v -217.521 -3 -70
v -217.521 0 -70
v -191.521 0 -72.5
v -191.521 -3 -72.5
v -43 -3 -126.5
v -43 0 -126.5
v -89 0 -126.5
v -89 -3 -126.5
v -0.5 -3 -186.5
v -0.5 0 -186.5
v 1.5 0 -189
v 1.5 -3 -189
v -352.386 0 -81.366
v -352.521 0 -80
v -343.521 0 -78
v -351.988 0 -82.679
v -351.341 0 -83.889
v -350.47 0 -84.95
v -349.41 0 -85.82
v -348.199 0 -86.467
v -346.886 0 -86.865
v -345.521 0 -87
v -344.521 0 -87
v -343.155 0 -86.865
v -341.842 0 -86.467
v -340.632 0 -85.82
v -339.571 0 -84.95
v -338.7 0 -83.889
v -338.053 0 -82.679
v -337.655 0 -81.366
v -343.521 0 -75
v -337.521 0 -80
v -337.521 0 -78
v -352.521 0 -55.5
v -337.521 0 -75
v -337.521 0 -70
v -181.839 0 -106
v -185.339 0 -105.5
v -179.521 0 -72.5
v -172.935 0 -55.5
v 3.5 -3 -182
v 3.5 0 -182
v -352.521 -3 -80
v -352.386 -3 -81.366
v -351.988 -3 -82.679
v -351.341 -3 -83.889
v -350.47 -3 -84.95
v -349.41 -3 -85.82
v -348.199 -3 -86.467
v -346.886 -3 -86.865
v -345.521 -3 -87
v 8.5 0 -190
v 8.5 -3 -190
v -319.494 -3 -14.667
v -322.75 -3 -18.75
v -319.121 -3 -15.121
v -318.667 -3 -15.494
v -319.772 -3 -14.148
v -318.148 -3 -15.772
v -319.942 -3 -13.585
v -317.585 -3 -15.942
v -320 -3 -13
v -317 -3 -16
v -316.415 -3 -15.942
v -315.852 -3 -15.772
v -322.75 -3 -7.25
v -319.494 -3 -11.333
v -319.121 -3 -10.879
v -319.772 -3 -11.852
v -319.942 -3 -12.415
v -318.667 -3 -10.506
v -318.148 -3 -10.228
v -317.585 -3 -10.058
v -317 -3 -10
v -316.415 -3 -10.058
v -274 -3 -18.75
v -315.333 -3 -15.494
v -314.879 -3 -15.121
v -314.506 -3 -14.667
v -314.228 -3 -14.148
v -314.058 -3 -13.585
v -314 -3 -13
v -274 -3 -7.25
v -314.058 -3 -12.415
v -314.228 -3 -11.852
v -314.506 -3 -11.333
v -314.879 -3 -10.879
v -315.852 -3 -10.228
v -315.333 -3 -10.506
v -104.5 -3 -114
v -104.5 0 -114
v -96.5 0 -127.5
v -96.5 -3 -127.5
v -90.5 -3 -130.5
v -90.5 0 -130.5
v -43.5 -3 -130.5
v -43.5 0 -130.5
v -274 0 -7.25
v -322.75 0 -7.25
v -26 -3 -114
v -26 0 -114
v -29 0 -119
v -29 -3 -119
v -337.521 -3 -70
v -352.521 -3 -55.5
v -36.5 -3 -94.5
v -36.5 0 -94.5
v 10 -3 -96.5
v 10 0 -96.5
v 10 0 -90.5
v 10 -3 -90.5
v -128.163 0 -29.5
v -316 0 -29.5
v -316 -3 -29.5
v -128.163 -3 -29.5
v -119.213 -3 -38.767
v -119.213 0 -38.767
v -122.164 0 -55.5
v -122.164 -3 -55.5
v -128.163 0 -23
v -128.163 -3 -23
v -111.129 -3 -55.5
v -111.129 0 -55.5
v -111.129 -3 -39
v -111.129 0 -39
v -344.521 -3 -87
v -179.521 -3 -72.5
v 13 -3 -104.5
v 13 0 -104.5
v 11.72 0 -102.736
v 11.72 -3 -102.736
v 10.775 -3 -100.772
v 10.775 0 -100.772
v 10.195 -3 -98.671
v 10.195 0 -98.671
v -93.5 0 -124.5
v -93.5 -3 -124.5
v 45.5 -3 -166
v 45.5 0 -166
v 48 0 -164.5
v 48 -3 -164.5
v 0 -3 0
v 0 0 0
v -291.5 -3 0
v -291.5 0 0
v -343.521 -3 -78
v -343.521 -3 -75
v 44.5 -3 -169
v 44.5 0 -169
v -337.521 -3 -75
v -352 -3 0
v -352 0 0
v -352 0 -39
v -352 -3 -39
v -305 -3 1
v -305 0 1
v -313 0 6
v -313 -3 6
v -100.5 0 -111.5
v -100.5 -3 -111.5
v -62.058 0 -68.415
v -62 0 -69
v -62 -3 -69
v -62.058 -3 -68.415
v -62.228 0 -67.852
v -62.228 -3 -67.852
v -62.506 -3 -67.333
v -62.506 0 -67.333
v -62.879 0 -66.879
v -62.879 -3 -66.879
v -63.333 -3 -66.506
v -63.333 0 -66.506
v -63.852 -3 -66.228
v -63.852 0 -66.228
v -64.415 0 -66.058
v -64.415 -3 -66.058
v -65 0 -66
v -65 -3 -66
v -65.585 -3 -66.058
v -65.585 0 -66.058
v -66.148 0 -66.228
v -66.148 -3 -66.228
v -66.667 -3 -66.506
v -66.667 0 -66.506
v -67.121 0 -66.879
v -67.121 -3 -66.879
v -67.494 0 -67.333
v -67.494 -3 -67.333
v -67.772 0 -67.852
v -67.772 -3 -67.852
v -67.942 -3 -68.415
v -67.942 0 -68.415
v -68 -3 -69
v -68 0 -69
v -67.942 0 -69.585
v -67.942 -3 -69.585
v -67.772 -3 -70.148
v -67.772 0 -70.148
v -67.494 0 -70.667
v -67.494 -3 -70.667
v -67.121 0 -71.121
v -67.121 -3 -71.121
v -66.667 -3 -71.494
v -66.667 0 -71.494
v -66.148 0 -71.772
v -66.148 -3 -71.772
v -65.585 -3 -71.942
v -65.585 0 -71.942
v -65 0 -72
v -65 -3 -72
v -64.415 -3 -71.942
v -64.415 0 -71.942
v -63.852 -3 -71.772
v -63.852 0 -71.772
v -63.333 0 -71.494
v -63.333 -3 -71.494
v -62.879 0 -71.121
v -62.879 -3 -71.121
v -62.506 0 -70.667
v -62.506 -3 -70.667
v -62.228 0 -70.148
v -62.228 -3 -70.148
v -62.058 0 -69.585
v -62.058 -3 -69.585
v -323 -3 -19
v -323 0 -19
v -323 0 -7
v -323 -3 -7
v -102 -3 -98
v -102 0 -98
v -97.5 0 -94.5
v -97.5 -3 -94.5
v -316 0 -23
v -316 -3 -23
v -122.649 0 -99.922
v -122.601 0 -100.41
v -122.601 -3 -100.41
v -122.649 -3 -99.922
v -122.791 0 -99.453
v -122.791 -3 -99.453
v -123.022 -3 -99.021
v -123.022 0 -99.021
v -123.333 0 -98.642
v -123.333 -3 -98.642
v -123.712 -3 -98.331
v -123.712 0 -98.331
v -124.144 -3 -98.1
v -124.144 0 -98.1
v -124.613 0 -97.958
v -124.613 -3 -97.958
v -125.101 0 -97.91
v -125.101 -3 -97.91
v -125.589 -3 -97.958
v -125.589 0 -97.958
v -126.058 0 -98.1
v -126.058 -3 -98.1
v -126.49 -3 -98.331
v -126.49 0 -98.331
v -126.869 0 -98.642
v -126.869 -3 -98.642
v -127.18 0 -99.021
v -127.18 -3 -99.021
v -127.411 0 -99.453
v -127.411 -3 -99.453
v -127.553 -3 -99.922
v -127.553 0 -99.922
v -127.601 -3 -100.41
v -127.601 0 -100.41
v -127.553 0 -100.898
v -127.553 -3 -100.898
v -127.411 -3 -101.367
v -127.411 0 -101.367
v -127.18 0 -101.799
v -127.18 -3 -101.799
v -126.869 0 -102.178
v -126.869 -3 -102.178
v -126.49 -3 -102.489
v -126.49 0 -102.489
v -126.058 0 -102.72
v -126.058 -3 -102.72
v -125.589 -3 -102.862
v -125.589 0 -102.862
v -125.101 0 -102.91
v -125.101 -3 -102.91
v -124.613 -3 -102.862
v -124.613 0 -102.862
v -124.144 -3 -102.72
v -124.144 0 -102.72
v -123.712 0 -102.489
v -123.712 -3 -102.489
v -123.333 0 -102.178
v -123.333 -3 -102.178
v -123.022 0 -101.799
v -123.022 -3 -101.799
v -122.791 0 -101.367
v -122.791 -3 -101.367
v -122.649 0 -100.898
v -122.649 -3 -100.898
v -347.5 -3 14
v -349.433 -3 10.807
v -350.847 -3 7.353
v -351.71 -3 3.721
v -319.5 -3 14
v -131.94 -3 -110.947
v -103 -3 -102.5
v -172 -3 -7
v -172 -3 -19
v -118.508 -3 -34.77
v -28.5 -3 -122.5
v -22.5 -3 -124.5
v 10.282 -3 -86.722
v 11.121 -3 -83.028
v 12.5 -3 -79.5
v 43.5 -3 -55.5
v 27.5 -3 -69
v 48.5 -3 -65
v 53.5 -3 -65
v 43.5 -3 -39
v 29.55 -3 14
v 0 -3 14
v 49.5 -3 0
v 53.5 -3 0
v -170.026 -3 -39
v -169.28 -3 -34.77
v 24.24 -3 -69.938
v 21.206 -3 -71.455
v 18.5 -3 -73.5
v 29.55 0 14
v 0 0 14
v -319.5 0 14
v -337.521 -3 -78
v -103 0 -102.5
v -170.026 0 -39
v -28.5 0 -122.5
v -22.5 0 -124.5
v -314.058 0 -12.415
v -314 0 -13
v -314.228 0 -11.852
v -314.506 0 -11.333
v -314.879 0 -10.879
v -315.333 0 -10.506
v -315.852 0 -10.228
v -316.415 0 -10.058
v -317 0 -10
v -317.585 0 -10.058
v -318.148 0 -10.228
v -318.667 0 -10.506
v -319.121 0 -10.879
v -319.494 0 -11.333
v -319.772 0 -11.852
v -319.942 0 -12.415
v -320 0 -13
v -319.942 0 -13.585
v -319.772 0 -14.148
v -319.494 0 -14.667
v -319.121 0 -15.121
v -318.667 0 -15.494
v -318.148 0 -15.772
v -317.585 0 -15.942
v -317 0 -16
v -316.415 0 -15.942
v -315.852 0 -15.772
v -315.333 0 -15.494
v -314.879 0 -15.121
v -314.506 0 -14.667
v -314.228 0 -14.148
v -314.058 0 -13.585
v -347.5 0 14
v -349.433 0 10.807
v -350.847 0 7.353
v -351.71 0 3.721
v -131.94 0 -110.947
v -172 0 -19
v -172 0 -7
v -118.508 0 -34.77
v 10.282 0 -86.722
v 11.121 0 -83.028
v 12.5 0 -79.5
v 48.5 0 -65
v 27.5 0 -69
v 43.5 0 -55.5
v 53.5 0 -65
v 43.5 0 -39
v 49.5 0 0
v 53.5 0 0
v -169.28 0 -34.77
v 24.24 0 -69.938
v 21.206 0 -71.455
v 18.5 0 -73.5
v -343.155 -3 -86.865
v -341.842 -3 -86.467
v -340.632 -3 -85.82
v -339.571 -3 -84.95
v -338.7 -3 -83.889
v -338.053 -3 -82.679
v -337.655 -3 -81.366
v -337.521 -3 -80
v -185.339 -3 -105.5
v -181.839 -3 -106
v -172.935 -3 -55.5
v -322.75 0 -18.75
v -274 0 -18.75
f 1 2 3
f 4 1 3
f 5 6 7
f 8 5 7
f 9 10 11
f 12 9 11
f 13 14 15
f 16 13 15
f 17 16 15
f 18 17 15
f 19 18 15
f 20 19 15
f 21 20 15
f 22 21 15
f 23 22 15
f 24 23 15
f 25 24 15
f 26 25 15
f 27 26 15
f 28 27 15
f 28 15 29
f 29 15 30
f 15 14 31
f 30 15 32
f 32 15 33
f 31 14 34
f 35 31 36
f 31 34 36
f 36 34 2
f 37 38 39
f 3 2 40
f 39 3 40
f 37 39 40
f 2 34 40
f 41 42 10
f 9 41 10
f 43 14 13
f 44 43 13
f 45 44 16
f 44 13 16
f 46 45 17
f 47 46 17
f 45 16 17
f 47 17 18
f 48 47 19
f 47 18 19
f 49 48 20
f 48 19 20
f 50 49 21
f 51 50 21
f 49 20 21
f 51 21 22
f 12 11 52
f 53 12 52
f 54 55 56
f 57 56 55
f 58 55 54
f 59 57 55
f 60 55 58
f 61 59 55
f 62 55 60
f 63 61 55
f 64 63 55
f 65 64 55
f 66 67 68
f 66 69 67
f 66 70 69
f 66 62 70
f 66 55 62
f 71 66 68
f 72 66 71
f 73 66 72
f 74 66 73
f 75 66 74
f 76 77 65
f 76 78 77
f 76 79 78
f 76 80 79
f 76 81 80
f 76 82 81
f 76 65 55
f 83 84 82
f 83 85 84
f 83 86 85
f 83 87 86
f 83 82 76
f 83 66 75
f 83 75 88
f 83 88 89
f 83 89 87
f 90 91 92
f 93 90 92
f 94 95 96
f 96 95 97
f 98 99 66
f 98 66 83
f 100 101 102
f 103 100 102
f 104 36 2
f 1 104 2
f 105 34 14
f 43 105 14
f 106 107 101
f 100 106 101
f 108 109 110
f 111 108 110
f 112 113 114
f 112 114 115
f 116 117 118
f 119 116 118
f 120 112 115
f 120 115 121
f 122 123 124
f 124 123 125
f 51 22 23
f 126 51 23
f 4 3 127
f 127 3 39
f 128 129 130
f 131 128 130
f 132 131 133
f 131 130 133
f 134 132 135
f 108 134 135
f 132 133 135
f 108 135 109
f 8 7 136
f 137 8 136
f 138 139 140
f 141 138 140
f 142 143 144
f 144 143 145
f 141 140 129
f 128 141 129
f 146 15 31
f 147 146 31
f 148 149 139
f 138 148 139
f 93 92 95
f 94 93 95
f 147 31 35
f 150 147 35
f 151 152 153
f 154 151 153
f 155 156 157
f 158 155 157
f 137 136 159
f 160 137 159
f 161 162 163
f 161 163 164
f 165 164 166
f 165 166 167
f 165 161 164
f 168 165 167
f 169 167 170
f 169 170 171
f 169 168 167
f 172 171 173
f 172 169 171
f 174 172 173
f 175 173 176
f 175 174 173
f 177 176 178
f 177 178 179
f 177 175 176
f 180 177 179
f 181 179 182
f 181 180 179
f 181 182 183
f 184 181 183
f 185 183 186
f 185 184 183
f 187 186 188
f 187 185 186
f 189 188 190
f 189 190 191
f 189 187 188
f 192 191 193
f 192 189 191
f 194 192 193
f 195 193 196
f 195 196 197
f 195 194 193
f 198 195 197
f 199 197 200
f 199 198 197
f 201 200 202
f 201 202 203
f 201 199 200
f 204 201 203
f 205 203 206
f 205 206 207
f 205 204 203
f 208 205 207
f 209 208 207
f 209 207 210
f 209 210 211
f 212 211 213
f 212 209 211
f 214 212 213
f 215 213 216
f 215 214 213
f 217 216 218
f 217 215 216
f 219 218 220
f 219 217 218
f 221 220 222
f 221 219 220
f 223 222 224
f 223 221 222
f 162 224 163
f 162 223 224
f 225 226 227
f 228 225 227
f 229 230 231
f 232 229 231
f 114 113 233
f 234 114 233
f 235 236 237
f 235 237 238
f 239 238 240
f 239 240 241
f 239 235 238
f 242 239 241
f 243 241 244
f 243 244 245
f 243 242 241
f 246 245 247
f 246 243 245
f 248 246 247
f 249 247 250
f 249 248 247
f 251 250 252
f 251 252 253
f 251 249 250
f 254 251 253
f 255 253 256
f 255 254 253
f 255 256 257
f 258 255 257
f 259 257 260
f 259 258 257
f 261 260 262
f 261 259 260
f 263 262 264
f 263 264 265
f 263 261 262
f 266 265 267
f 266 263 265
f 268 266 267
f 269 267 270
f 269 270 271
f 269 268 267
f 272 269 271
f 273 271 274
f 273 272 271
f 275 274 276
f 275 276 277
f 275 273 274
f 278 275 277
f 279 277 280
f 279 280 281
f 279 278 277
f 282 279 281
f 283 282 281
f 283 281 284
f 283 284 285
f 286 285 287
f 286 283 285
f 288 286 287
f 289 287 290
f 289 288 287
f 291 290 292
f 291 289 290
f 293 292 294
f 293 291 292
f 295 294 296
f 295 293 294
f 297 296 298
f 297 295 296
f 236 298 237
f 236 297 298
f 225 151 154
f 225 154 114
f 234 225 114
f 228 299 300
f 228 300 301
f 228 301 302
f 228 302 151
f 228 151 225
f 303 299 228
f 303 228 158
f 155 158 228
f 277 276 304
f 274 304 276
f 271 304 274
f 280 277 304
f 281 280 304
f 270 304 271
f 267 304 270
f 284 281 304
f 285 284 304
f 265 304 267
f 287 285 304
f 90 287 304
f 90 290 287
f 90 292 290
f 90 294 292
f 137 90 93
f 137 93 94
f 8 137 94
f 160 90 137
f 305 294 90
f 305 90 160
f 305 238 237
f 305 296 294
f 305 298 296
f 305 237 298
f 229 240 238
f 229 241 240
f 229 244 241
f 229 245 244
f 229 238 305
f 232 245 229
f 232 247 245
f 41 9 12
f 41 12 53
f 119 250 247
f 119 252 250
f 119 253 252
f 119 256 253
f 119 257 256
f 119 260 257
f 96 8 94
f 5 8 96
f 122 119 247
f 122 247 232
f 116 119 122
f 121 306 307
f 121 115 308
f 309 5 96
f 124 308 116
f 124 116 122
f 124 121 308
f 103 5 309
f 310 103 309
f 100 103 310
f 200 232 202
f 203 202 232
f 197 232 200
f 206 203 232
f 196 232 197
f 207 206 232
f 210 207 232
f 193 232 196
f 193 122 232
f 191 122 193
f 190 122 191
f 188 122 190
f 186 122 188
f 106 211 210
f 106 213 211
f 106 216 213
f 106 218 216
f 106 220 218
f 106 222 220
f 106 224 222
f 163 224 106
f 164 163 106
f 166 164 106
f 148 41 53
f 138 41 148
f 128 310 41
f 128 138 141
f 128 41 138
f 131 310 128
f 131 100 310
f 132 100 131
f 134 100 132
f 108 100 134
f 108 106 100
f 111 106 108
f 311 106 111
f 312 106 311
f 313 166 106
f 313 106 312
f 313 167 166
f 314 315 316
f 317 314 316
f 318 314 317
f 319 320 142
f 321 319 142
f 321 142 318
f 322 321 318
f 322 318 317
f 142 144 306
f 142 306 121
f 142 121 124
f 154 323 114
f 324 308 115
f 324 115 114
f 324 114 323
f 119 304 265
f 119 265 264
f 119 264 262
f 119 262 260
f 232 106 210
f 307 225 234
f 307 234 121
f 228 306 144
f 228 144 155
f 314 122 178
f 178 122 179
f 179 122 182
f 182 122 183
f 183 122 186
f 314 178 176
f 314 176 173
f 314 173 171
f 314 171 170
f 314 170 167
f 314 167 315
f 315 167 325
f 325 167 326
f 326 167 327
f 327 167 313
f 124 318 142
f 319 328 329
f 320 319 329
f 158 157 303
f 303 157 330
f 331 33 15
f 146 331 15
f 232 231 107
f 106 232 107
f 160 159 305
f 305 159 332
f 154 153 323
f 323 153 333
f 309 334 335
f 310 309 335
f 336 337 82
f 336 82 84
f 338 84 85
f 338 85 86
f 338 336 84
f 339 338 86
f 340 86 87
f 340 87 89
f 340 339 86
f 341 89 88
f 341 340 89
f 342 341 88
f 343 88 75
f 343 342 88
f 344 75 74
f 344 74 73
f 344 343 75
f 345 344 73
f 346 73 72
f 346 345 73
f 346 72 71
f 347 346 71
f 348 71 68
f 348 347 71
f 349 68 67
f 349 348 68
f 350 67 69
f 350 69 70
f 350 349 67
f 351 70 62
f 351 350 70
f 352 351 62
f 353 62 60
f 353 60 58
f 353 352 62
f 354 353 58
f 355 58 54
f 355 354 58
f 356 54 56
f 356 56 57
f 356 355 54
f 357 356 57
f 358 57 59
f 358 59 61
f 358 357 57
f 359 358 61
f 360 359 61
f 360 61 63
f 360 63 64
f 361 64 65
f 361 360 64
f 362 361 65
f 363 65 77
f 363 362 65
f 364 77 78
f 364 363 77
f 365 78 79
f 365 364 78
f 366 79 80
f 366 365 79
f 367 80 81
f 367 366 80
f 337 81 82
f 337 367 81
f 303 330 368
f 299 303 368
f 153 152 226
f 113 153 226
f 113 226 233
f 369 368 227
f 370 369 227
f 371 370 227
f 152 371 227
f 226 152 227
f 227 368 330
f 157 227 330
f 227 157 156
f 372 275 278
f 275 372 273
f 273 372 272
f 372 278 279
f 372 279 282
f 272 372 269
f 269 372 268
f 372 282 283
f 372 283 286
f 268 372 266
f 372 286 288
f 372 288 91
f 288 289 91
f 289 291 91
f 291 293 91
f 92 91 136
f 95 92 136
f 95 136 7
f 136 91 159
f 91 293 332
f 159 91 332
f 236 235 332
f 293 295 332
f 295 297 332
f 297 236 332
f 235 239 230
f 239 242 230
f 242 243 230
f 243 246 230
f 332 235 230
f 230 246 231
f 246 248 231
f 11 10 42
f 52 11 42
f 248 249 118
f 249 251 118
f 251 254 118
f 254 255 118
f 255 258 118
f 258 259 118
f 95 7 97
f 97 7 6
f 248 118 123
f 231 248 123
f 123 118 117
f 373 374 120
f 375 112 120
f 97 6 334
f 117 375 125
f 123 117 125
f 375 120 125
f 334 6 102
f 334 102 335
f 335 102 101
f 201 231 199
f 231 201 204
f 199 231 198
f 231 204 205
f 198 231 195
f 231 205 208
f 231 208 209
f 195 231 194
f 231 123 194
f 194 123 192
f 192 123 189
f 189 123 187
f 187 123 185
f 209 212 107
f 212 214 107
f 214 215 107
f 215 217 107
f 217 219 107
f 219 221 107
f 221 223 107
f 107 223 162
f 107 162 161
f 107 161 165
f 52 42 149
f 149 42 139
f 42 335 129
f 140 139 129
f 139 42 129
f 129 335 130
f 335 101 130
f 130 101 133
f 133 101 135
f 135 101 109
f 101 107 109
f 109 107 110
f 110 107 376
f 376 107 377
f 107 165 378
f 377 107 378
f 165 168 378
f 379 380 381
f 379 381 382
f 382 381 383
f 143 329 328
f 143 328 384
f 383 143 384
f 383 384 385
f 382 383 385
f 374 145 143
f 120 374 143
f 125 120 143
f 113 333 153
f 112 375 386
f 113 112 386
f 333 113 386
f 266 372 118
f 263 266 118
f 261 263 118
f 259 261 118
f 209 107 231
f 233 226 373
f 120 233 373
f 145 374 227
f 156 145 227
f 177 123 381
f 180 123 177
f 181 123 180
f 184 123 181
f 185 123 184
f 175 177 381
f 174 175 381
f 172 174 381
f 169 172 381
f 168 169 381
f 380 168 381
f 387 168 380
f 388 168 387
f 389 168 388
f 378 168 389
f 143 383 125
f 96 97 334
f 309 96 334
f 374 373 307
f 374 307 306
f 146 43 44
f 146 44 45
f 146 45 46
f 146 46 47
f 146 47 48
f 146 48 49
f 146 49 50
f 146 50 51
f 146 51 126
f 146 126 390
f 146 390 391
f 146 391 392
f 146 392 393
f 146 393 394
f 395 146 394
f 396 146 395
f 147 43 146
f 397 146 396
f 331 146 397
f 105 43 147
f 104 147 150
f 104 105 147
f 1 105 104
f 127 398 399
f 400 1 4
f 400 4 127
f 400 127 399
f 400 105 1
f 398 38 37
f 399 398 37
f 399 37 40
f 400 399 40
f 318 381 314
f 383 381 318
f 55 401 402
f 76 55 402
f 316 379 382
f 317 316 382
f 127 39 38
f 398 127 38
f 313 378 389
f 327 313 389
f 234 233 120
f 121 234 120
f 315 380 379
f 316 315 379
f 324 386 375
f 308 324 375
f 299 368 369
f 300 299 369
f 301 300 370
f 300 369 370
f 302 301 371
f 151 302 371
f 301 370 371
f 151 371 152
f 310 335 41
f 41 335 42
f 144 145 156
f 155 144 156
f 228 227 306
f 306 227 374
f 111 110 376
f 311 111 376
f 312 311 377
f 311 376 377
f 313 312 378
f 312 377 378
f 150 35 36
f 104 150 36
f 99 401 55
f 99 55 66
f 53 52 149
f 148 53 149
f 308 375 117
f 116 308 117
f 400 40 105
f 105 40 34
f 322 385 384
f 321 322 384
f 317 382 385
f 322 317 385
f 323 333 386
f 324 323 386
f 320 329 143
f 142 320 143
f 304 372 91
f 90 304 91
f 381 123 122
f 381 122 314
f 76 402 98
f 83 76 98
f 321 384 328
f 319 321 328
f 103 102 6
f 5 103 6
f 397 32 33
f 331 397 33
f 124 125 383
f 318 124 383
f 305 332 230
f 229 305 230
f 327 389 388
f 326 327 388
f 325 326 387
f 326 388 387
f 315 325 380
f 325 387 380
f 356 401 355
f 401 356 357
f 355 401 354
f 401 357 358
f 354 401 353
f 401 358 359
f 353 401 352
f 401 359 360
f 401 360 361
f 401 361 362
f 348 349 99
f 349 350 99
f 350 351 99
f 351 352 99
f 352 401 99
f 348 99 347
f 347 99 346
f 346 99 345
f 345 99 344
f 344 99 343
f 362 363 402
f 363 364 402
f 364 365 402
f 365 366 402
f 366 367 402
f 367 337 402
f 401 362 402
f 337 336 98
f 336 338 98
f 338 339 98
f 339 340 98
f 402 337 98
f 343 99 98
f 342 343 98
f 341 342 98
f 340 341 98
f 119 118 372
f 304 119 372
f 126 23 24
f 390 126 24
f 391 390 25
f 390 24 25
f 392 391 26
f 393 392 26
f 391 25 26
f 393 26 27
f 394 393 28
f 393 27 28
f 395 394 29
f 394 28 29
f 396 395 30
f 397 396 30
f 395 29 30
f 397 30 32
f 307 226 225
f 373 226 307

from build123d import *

# Parameters (mm, degrees)
F0_R     = 2.5
F0_W     = 187.8374901577
F0_H     = 6.5
F0_W_2   = 151
F0_H_2   = 12
F0_R_2   = 3
F0_W_3   = 154.6288044202
F0_H_3   = 16.5
F1_DEPTH = 3
F0_W_4   = 48.75
F0_H_4   = 11.5


with BuildPart() as f1:
    # F0 (on Front) → F1 (new body)
    with BuildSketch(Plane.XZ):
        with BuildLine():
            Line((48.5, -65), (53.5, -65))
            Line((53.5, -65), (53.5, 0))
            Line((53.5, 0), (49.5, 0))
            Line((49.5, 0), (29.55, 14))
            Line((29.55, 14), (0, 14))
            Line((0, 14), (0, 0))
            Line((0, 0), (-291.5, 0))
            Line((-291.5, 0), (-305, 1))
            Line((-305, 1), (-313, 6))
            Line((-313, 6), (-319.5, 14))
            Line((-319.5, 14), (-347.5, 14))
            ThreePointArc((-347.5, 14), (-350.8473529309, 7.3527205849), (-352, 0))
            Line((-352, 0), (-352, -39))
            Line((-352, -39), (-170.0255081496, -39))
            Line((-170.0255081496, -39), (-169.2796367248, -34.7699529486))
            Line((-169.2796367248, -34.7699529486), (-118.5083061305, -34.7699529486))
            Line((-118.5083061305, -34.7699529486), (-119.2130711177, -38.7668738074))
            Line((-119.2130711177, -38.7668738074), (-122.163572737, -55.5))
            Line((-122.163572737, -55.5), (-131.940312204, -110.9466447942))
            Line((-131.940312204, -110.9466447942), (-104.5, -114))
            Line((-104.5, -114), (-96.5, -127.5))
            Line((-96.5, -127.5), (-90.5, -130.5))
            Line((-90.5, -130.5), (-43.5, -130.5))
            Line((-43.5, -130.5), (-28.5, -122.5))
            Line((-28.5, -122.5), (-22.5, -124.5))
            Line((-22.5, -124.5), (3.5, -182))
            Line((3.5, -182), (-0.5, -186.5))
            Line((-0.5, -186.5), (1.5, -189))
            Line((1.5, -189), (8.5, -190))
            Line((8.5, -190), (44.5, -169))
            Line((44.5, -169), (45.5, -166))
            Line((45.5, -166), (48, -164.5))
            Line((48, -164.5), (13, -104.5))
            ThreePointArc((13, -104.5), (10.7746616729, -100.7720018727), (10, -96.5))
            Line((10, -96.5), (10, -90.5))
            ThreePointArc((10, -90.5), (10.6328688201, -84.8597429137), (12.5, -79.5))
            Line((12.5, -79.5), (18.5, -73.5))
            ThreePointArc((18.5, -73.5), (22.688171875, -70.6263437501), (27.5, -69))
            Line((27.5, -69), (48.5, -65))
        make_face()
        with Locations((-125.101, -100.41)):
            Circle(F0_R, mode=Mode.SUBTRACT)
        Polygon((-36.5, -94.5), (-26, -114), (-29, -119), (-43, -126.5), (-89, -126.5), (-93.5, -124.5), (-100.5, -111.5), (-103, -102.5), (-102, -98), (-97.5, -94.5), align=None, mode=Mode.SUBTRACT)
        with Locations((-222.0812549212, -26.25)):
            Rectangle(F0_W, F0_H, mode=Mode.SUBTRACT)
        with Locations((-247.5, -13)):
            Rectangle(F0_W_2, F0_H_2, mode=Mode.SUBTRACT)
        with Locations((-65, -69)):
            Circle(F0_R_2, mode=Mode.SUBTRACT)
        with Locations((-33.8144022101, -47.25)):
            Rectangle(F0_W_3, F0_H_3, mode=Mode.SUBTRACT)
    extrude(amount=F1_DEPTH)


with BuildPart() as f1b:
    # F0 (on Front) → F1, piece 2 (new body)
    with BuildSketch(Plane.XZ):
        with BuildLine():
            ThreePointArc((-352.5206254937, -80), (-350.470372962, -84.9497474683), (-345.5206254937, -87))
            Line((-345.5206254937, -87), (-344.5206254937, -87))
            ThreePointArc((-344.5206254937, -87), (-339.5708780254, -84.9497474683), (-337.5206254937, -80))
            Line((-337.5206254937, -80), (-337.5206254937, -78))
            Line((-337.5206254937, -78), (-343.5206254937, -78))
            Line((-343.5206254937, -78), (-343.5206254937, -75))
            Line((-343.5206254937, -75), (-337.5206254937, -75))
            Line((-337.5206254937, -75), (-337.5206254937, -70))
            Line((-337.5206254937, -70), (-217.5206254937, -70))
            Line((-217.5206254937, -70), (-191.5206254937, -72.5))
            Line((-191.5206254937, -72.5), (-179.5206254937, -72.5))
            Line((-179.5206254937, -72.5), (-185.3394158571, -105.5))
            Line((-185.3394158571, -105.5), (-181.8394158571, -106))
            Line((-181.8394158571, -106), (-172.9349033313, -55.5))
            Line((-172.9349033313, -55.5), (-352.5206254937, -55.5))
            Line((-352.5206254937, -55.5), (-352.5206254937, -80))
        make_face()
    extrude(amount=F1_DEPTH)


with BuildPart() as f1c:
    # F0 (on Front) → F1, piece 3 (new body)
    with BuildSketch(Plane.XZ):
        with Locations((-298.375, -13)):
            Rectangle(F0_W_4, F0_H_4)
        with Locations((-317, -13)):
            Circle(F0_R_2, mode=Mode.SUBTRACT)
    extrude(amount=F1_DEPTH)


solid = Compound([f1.part, f1b.part, f1c.part])
